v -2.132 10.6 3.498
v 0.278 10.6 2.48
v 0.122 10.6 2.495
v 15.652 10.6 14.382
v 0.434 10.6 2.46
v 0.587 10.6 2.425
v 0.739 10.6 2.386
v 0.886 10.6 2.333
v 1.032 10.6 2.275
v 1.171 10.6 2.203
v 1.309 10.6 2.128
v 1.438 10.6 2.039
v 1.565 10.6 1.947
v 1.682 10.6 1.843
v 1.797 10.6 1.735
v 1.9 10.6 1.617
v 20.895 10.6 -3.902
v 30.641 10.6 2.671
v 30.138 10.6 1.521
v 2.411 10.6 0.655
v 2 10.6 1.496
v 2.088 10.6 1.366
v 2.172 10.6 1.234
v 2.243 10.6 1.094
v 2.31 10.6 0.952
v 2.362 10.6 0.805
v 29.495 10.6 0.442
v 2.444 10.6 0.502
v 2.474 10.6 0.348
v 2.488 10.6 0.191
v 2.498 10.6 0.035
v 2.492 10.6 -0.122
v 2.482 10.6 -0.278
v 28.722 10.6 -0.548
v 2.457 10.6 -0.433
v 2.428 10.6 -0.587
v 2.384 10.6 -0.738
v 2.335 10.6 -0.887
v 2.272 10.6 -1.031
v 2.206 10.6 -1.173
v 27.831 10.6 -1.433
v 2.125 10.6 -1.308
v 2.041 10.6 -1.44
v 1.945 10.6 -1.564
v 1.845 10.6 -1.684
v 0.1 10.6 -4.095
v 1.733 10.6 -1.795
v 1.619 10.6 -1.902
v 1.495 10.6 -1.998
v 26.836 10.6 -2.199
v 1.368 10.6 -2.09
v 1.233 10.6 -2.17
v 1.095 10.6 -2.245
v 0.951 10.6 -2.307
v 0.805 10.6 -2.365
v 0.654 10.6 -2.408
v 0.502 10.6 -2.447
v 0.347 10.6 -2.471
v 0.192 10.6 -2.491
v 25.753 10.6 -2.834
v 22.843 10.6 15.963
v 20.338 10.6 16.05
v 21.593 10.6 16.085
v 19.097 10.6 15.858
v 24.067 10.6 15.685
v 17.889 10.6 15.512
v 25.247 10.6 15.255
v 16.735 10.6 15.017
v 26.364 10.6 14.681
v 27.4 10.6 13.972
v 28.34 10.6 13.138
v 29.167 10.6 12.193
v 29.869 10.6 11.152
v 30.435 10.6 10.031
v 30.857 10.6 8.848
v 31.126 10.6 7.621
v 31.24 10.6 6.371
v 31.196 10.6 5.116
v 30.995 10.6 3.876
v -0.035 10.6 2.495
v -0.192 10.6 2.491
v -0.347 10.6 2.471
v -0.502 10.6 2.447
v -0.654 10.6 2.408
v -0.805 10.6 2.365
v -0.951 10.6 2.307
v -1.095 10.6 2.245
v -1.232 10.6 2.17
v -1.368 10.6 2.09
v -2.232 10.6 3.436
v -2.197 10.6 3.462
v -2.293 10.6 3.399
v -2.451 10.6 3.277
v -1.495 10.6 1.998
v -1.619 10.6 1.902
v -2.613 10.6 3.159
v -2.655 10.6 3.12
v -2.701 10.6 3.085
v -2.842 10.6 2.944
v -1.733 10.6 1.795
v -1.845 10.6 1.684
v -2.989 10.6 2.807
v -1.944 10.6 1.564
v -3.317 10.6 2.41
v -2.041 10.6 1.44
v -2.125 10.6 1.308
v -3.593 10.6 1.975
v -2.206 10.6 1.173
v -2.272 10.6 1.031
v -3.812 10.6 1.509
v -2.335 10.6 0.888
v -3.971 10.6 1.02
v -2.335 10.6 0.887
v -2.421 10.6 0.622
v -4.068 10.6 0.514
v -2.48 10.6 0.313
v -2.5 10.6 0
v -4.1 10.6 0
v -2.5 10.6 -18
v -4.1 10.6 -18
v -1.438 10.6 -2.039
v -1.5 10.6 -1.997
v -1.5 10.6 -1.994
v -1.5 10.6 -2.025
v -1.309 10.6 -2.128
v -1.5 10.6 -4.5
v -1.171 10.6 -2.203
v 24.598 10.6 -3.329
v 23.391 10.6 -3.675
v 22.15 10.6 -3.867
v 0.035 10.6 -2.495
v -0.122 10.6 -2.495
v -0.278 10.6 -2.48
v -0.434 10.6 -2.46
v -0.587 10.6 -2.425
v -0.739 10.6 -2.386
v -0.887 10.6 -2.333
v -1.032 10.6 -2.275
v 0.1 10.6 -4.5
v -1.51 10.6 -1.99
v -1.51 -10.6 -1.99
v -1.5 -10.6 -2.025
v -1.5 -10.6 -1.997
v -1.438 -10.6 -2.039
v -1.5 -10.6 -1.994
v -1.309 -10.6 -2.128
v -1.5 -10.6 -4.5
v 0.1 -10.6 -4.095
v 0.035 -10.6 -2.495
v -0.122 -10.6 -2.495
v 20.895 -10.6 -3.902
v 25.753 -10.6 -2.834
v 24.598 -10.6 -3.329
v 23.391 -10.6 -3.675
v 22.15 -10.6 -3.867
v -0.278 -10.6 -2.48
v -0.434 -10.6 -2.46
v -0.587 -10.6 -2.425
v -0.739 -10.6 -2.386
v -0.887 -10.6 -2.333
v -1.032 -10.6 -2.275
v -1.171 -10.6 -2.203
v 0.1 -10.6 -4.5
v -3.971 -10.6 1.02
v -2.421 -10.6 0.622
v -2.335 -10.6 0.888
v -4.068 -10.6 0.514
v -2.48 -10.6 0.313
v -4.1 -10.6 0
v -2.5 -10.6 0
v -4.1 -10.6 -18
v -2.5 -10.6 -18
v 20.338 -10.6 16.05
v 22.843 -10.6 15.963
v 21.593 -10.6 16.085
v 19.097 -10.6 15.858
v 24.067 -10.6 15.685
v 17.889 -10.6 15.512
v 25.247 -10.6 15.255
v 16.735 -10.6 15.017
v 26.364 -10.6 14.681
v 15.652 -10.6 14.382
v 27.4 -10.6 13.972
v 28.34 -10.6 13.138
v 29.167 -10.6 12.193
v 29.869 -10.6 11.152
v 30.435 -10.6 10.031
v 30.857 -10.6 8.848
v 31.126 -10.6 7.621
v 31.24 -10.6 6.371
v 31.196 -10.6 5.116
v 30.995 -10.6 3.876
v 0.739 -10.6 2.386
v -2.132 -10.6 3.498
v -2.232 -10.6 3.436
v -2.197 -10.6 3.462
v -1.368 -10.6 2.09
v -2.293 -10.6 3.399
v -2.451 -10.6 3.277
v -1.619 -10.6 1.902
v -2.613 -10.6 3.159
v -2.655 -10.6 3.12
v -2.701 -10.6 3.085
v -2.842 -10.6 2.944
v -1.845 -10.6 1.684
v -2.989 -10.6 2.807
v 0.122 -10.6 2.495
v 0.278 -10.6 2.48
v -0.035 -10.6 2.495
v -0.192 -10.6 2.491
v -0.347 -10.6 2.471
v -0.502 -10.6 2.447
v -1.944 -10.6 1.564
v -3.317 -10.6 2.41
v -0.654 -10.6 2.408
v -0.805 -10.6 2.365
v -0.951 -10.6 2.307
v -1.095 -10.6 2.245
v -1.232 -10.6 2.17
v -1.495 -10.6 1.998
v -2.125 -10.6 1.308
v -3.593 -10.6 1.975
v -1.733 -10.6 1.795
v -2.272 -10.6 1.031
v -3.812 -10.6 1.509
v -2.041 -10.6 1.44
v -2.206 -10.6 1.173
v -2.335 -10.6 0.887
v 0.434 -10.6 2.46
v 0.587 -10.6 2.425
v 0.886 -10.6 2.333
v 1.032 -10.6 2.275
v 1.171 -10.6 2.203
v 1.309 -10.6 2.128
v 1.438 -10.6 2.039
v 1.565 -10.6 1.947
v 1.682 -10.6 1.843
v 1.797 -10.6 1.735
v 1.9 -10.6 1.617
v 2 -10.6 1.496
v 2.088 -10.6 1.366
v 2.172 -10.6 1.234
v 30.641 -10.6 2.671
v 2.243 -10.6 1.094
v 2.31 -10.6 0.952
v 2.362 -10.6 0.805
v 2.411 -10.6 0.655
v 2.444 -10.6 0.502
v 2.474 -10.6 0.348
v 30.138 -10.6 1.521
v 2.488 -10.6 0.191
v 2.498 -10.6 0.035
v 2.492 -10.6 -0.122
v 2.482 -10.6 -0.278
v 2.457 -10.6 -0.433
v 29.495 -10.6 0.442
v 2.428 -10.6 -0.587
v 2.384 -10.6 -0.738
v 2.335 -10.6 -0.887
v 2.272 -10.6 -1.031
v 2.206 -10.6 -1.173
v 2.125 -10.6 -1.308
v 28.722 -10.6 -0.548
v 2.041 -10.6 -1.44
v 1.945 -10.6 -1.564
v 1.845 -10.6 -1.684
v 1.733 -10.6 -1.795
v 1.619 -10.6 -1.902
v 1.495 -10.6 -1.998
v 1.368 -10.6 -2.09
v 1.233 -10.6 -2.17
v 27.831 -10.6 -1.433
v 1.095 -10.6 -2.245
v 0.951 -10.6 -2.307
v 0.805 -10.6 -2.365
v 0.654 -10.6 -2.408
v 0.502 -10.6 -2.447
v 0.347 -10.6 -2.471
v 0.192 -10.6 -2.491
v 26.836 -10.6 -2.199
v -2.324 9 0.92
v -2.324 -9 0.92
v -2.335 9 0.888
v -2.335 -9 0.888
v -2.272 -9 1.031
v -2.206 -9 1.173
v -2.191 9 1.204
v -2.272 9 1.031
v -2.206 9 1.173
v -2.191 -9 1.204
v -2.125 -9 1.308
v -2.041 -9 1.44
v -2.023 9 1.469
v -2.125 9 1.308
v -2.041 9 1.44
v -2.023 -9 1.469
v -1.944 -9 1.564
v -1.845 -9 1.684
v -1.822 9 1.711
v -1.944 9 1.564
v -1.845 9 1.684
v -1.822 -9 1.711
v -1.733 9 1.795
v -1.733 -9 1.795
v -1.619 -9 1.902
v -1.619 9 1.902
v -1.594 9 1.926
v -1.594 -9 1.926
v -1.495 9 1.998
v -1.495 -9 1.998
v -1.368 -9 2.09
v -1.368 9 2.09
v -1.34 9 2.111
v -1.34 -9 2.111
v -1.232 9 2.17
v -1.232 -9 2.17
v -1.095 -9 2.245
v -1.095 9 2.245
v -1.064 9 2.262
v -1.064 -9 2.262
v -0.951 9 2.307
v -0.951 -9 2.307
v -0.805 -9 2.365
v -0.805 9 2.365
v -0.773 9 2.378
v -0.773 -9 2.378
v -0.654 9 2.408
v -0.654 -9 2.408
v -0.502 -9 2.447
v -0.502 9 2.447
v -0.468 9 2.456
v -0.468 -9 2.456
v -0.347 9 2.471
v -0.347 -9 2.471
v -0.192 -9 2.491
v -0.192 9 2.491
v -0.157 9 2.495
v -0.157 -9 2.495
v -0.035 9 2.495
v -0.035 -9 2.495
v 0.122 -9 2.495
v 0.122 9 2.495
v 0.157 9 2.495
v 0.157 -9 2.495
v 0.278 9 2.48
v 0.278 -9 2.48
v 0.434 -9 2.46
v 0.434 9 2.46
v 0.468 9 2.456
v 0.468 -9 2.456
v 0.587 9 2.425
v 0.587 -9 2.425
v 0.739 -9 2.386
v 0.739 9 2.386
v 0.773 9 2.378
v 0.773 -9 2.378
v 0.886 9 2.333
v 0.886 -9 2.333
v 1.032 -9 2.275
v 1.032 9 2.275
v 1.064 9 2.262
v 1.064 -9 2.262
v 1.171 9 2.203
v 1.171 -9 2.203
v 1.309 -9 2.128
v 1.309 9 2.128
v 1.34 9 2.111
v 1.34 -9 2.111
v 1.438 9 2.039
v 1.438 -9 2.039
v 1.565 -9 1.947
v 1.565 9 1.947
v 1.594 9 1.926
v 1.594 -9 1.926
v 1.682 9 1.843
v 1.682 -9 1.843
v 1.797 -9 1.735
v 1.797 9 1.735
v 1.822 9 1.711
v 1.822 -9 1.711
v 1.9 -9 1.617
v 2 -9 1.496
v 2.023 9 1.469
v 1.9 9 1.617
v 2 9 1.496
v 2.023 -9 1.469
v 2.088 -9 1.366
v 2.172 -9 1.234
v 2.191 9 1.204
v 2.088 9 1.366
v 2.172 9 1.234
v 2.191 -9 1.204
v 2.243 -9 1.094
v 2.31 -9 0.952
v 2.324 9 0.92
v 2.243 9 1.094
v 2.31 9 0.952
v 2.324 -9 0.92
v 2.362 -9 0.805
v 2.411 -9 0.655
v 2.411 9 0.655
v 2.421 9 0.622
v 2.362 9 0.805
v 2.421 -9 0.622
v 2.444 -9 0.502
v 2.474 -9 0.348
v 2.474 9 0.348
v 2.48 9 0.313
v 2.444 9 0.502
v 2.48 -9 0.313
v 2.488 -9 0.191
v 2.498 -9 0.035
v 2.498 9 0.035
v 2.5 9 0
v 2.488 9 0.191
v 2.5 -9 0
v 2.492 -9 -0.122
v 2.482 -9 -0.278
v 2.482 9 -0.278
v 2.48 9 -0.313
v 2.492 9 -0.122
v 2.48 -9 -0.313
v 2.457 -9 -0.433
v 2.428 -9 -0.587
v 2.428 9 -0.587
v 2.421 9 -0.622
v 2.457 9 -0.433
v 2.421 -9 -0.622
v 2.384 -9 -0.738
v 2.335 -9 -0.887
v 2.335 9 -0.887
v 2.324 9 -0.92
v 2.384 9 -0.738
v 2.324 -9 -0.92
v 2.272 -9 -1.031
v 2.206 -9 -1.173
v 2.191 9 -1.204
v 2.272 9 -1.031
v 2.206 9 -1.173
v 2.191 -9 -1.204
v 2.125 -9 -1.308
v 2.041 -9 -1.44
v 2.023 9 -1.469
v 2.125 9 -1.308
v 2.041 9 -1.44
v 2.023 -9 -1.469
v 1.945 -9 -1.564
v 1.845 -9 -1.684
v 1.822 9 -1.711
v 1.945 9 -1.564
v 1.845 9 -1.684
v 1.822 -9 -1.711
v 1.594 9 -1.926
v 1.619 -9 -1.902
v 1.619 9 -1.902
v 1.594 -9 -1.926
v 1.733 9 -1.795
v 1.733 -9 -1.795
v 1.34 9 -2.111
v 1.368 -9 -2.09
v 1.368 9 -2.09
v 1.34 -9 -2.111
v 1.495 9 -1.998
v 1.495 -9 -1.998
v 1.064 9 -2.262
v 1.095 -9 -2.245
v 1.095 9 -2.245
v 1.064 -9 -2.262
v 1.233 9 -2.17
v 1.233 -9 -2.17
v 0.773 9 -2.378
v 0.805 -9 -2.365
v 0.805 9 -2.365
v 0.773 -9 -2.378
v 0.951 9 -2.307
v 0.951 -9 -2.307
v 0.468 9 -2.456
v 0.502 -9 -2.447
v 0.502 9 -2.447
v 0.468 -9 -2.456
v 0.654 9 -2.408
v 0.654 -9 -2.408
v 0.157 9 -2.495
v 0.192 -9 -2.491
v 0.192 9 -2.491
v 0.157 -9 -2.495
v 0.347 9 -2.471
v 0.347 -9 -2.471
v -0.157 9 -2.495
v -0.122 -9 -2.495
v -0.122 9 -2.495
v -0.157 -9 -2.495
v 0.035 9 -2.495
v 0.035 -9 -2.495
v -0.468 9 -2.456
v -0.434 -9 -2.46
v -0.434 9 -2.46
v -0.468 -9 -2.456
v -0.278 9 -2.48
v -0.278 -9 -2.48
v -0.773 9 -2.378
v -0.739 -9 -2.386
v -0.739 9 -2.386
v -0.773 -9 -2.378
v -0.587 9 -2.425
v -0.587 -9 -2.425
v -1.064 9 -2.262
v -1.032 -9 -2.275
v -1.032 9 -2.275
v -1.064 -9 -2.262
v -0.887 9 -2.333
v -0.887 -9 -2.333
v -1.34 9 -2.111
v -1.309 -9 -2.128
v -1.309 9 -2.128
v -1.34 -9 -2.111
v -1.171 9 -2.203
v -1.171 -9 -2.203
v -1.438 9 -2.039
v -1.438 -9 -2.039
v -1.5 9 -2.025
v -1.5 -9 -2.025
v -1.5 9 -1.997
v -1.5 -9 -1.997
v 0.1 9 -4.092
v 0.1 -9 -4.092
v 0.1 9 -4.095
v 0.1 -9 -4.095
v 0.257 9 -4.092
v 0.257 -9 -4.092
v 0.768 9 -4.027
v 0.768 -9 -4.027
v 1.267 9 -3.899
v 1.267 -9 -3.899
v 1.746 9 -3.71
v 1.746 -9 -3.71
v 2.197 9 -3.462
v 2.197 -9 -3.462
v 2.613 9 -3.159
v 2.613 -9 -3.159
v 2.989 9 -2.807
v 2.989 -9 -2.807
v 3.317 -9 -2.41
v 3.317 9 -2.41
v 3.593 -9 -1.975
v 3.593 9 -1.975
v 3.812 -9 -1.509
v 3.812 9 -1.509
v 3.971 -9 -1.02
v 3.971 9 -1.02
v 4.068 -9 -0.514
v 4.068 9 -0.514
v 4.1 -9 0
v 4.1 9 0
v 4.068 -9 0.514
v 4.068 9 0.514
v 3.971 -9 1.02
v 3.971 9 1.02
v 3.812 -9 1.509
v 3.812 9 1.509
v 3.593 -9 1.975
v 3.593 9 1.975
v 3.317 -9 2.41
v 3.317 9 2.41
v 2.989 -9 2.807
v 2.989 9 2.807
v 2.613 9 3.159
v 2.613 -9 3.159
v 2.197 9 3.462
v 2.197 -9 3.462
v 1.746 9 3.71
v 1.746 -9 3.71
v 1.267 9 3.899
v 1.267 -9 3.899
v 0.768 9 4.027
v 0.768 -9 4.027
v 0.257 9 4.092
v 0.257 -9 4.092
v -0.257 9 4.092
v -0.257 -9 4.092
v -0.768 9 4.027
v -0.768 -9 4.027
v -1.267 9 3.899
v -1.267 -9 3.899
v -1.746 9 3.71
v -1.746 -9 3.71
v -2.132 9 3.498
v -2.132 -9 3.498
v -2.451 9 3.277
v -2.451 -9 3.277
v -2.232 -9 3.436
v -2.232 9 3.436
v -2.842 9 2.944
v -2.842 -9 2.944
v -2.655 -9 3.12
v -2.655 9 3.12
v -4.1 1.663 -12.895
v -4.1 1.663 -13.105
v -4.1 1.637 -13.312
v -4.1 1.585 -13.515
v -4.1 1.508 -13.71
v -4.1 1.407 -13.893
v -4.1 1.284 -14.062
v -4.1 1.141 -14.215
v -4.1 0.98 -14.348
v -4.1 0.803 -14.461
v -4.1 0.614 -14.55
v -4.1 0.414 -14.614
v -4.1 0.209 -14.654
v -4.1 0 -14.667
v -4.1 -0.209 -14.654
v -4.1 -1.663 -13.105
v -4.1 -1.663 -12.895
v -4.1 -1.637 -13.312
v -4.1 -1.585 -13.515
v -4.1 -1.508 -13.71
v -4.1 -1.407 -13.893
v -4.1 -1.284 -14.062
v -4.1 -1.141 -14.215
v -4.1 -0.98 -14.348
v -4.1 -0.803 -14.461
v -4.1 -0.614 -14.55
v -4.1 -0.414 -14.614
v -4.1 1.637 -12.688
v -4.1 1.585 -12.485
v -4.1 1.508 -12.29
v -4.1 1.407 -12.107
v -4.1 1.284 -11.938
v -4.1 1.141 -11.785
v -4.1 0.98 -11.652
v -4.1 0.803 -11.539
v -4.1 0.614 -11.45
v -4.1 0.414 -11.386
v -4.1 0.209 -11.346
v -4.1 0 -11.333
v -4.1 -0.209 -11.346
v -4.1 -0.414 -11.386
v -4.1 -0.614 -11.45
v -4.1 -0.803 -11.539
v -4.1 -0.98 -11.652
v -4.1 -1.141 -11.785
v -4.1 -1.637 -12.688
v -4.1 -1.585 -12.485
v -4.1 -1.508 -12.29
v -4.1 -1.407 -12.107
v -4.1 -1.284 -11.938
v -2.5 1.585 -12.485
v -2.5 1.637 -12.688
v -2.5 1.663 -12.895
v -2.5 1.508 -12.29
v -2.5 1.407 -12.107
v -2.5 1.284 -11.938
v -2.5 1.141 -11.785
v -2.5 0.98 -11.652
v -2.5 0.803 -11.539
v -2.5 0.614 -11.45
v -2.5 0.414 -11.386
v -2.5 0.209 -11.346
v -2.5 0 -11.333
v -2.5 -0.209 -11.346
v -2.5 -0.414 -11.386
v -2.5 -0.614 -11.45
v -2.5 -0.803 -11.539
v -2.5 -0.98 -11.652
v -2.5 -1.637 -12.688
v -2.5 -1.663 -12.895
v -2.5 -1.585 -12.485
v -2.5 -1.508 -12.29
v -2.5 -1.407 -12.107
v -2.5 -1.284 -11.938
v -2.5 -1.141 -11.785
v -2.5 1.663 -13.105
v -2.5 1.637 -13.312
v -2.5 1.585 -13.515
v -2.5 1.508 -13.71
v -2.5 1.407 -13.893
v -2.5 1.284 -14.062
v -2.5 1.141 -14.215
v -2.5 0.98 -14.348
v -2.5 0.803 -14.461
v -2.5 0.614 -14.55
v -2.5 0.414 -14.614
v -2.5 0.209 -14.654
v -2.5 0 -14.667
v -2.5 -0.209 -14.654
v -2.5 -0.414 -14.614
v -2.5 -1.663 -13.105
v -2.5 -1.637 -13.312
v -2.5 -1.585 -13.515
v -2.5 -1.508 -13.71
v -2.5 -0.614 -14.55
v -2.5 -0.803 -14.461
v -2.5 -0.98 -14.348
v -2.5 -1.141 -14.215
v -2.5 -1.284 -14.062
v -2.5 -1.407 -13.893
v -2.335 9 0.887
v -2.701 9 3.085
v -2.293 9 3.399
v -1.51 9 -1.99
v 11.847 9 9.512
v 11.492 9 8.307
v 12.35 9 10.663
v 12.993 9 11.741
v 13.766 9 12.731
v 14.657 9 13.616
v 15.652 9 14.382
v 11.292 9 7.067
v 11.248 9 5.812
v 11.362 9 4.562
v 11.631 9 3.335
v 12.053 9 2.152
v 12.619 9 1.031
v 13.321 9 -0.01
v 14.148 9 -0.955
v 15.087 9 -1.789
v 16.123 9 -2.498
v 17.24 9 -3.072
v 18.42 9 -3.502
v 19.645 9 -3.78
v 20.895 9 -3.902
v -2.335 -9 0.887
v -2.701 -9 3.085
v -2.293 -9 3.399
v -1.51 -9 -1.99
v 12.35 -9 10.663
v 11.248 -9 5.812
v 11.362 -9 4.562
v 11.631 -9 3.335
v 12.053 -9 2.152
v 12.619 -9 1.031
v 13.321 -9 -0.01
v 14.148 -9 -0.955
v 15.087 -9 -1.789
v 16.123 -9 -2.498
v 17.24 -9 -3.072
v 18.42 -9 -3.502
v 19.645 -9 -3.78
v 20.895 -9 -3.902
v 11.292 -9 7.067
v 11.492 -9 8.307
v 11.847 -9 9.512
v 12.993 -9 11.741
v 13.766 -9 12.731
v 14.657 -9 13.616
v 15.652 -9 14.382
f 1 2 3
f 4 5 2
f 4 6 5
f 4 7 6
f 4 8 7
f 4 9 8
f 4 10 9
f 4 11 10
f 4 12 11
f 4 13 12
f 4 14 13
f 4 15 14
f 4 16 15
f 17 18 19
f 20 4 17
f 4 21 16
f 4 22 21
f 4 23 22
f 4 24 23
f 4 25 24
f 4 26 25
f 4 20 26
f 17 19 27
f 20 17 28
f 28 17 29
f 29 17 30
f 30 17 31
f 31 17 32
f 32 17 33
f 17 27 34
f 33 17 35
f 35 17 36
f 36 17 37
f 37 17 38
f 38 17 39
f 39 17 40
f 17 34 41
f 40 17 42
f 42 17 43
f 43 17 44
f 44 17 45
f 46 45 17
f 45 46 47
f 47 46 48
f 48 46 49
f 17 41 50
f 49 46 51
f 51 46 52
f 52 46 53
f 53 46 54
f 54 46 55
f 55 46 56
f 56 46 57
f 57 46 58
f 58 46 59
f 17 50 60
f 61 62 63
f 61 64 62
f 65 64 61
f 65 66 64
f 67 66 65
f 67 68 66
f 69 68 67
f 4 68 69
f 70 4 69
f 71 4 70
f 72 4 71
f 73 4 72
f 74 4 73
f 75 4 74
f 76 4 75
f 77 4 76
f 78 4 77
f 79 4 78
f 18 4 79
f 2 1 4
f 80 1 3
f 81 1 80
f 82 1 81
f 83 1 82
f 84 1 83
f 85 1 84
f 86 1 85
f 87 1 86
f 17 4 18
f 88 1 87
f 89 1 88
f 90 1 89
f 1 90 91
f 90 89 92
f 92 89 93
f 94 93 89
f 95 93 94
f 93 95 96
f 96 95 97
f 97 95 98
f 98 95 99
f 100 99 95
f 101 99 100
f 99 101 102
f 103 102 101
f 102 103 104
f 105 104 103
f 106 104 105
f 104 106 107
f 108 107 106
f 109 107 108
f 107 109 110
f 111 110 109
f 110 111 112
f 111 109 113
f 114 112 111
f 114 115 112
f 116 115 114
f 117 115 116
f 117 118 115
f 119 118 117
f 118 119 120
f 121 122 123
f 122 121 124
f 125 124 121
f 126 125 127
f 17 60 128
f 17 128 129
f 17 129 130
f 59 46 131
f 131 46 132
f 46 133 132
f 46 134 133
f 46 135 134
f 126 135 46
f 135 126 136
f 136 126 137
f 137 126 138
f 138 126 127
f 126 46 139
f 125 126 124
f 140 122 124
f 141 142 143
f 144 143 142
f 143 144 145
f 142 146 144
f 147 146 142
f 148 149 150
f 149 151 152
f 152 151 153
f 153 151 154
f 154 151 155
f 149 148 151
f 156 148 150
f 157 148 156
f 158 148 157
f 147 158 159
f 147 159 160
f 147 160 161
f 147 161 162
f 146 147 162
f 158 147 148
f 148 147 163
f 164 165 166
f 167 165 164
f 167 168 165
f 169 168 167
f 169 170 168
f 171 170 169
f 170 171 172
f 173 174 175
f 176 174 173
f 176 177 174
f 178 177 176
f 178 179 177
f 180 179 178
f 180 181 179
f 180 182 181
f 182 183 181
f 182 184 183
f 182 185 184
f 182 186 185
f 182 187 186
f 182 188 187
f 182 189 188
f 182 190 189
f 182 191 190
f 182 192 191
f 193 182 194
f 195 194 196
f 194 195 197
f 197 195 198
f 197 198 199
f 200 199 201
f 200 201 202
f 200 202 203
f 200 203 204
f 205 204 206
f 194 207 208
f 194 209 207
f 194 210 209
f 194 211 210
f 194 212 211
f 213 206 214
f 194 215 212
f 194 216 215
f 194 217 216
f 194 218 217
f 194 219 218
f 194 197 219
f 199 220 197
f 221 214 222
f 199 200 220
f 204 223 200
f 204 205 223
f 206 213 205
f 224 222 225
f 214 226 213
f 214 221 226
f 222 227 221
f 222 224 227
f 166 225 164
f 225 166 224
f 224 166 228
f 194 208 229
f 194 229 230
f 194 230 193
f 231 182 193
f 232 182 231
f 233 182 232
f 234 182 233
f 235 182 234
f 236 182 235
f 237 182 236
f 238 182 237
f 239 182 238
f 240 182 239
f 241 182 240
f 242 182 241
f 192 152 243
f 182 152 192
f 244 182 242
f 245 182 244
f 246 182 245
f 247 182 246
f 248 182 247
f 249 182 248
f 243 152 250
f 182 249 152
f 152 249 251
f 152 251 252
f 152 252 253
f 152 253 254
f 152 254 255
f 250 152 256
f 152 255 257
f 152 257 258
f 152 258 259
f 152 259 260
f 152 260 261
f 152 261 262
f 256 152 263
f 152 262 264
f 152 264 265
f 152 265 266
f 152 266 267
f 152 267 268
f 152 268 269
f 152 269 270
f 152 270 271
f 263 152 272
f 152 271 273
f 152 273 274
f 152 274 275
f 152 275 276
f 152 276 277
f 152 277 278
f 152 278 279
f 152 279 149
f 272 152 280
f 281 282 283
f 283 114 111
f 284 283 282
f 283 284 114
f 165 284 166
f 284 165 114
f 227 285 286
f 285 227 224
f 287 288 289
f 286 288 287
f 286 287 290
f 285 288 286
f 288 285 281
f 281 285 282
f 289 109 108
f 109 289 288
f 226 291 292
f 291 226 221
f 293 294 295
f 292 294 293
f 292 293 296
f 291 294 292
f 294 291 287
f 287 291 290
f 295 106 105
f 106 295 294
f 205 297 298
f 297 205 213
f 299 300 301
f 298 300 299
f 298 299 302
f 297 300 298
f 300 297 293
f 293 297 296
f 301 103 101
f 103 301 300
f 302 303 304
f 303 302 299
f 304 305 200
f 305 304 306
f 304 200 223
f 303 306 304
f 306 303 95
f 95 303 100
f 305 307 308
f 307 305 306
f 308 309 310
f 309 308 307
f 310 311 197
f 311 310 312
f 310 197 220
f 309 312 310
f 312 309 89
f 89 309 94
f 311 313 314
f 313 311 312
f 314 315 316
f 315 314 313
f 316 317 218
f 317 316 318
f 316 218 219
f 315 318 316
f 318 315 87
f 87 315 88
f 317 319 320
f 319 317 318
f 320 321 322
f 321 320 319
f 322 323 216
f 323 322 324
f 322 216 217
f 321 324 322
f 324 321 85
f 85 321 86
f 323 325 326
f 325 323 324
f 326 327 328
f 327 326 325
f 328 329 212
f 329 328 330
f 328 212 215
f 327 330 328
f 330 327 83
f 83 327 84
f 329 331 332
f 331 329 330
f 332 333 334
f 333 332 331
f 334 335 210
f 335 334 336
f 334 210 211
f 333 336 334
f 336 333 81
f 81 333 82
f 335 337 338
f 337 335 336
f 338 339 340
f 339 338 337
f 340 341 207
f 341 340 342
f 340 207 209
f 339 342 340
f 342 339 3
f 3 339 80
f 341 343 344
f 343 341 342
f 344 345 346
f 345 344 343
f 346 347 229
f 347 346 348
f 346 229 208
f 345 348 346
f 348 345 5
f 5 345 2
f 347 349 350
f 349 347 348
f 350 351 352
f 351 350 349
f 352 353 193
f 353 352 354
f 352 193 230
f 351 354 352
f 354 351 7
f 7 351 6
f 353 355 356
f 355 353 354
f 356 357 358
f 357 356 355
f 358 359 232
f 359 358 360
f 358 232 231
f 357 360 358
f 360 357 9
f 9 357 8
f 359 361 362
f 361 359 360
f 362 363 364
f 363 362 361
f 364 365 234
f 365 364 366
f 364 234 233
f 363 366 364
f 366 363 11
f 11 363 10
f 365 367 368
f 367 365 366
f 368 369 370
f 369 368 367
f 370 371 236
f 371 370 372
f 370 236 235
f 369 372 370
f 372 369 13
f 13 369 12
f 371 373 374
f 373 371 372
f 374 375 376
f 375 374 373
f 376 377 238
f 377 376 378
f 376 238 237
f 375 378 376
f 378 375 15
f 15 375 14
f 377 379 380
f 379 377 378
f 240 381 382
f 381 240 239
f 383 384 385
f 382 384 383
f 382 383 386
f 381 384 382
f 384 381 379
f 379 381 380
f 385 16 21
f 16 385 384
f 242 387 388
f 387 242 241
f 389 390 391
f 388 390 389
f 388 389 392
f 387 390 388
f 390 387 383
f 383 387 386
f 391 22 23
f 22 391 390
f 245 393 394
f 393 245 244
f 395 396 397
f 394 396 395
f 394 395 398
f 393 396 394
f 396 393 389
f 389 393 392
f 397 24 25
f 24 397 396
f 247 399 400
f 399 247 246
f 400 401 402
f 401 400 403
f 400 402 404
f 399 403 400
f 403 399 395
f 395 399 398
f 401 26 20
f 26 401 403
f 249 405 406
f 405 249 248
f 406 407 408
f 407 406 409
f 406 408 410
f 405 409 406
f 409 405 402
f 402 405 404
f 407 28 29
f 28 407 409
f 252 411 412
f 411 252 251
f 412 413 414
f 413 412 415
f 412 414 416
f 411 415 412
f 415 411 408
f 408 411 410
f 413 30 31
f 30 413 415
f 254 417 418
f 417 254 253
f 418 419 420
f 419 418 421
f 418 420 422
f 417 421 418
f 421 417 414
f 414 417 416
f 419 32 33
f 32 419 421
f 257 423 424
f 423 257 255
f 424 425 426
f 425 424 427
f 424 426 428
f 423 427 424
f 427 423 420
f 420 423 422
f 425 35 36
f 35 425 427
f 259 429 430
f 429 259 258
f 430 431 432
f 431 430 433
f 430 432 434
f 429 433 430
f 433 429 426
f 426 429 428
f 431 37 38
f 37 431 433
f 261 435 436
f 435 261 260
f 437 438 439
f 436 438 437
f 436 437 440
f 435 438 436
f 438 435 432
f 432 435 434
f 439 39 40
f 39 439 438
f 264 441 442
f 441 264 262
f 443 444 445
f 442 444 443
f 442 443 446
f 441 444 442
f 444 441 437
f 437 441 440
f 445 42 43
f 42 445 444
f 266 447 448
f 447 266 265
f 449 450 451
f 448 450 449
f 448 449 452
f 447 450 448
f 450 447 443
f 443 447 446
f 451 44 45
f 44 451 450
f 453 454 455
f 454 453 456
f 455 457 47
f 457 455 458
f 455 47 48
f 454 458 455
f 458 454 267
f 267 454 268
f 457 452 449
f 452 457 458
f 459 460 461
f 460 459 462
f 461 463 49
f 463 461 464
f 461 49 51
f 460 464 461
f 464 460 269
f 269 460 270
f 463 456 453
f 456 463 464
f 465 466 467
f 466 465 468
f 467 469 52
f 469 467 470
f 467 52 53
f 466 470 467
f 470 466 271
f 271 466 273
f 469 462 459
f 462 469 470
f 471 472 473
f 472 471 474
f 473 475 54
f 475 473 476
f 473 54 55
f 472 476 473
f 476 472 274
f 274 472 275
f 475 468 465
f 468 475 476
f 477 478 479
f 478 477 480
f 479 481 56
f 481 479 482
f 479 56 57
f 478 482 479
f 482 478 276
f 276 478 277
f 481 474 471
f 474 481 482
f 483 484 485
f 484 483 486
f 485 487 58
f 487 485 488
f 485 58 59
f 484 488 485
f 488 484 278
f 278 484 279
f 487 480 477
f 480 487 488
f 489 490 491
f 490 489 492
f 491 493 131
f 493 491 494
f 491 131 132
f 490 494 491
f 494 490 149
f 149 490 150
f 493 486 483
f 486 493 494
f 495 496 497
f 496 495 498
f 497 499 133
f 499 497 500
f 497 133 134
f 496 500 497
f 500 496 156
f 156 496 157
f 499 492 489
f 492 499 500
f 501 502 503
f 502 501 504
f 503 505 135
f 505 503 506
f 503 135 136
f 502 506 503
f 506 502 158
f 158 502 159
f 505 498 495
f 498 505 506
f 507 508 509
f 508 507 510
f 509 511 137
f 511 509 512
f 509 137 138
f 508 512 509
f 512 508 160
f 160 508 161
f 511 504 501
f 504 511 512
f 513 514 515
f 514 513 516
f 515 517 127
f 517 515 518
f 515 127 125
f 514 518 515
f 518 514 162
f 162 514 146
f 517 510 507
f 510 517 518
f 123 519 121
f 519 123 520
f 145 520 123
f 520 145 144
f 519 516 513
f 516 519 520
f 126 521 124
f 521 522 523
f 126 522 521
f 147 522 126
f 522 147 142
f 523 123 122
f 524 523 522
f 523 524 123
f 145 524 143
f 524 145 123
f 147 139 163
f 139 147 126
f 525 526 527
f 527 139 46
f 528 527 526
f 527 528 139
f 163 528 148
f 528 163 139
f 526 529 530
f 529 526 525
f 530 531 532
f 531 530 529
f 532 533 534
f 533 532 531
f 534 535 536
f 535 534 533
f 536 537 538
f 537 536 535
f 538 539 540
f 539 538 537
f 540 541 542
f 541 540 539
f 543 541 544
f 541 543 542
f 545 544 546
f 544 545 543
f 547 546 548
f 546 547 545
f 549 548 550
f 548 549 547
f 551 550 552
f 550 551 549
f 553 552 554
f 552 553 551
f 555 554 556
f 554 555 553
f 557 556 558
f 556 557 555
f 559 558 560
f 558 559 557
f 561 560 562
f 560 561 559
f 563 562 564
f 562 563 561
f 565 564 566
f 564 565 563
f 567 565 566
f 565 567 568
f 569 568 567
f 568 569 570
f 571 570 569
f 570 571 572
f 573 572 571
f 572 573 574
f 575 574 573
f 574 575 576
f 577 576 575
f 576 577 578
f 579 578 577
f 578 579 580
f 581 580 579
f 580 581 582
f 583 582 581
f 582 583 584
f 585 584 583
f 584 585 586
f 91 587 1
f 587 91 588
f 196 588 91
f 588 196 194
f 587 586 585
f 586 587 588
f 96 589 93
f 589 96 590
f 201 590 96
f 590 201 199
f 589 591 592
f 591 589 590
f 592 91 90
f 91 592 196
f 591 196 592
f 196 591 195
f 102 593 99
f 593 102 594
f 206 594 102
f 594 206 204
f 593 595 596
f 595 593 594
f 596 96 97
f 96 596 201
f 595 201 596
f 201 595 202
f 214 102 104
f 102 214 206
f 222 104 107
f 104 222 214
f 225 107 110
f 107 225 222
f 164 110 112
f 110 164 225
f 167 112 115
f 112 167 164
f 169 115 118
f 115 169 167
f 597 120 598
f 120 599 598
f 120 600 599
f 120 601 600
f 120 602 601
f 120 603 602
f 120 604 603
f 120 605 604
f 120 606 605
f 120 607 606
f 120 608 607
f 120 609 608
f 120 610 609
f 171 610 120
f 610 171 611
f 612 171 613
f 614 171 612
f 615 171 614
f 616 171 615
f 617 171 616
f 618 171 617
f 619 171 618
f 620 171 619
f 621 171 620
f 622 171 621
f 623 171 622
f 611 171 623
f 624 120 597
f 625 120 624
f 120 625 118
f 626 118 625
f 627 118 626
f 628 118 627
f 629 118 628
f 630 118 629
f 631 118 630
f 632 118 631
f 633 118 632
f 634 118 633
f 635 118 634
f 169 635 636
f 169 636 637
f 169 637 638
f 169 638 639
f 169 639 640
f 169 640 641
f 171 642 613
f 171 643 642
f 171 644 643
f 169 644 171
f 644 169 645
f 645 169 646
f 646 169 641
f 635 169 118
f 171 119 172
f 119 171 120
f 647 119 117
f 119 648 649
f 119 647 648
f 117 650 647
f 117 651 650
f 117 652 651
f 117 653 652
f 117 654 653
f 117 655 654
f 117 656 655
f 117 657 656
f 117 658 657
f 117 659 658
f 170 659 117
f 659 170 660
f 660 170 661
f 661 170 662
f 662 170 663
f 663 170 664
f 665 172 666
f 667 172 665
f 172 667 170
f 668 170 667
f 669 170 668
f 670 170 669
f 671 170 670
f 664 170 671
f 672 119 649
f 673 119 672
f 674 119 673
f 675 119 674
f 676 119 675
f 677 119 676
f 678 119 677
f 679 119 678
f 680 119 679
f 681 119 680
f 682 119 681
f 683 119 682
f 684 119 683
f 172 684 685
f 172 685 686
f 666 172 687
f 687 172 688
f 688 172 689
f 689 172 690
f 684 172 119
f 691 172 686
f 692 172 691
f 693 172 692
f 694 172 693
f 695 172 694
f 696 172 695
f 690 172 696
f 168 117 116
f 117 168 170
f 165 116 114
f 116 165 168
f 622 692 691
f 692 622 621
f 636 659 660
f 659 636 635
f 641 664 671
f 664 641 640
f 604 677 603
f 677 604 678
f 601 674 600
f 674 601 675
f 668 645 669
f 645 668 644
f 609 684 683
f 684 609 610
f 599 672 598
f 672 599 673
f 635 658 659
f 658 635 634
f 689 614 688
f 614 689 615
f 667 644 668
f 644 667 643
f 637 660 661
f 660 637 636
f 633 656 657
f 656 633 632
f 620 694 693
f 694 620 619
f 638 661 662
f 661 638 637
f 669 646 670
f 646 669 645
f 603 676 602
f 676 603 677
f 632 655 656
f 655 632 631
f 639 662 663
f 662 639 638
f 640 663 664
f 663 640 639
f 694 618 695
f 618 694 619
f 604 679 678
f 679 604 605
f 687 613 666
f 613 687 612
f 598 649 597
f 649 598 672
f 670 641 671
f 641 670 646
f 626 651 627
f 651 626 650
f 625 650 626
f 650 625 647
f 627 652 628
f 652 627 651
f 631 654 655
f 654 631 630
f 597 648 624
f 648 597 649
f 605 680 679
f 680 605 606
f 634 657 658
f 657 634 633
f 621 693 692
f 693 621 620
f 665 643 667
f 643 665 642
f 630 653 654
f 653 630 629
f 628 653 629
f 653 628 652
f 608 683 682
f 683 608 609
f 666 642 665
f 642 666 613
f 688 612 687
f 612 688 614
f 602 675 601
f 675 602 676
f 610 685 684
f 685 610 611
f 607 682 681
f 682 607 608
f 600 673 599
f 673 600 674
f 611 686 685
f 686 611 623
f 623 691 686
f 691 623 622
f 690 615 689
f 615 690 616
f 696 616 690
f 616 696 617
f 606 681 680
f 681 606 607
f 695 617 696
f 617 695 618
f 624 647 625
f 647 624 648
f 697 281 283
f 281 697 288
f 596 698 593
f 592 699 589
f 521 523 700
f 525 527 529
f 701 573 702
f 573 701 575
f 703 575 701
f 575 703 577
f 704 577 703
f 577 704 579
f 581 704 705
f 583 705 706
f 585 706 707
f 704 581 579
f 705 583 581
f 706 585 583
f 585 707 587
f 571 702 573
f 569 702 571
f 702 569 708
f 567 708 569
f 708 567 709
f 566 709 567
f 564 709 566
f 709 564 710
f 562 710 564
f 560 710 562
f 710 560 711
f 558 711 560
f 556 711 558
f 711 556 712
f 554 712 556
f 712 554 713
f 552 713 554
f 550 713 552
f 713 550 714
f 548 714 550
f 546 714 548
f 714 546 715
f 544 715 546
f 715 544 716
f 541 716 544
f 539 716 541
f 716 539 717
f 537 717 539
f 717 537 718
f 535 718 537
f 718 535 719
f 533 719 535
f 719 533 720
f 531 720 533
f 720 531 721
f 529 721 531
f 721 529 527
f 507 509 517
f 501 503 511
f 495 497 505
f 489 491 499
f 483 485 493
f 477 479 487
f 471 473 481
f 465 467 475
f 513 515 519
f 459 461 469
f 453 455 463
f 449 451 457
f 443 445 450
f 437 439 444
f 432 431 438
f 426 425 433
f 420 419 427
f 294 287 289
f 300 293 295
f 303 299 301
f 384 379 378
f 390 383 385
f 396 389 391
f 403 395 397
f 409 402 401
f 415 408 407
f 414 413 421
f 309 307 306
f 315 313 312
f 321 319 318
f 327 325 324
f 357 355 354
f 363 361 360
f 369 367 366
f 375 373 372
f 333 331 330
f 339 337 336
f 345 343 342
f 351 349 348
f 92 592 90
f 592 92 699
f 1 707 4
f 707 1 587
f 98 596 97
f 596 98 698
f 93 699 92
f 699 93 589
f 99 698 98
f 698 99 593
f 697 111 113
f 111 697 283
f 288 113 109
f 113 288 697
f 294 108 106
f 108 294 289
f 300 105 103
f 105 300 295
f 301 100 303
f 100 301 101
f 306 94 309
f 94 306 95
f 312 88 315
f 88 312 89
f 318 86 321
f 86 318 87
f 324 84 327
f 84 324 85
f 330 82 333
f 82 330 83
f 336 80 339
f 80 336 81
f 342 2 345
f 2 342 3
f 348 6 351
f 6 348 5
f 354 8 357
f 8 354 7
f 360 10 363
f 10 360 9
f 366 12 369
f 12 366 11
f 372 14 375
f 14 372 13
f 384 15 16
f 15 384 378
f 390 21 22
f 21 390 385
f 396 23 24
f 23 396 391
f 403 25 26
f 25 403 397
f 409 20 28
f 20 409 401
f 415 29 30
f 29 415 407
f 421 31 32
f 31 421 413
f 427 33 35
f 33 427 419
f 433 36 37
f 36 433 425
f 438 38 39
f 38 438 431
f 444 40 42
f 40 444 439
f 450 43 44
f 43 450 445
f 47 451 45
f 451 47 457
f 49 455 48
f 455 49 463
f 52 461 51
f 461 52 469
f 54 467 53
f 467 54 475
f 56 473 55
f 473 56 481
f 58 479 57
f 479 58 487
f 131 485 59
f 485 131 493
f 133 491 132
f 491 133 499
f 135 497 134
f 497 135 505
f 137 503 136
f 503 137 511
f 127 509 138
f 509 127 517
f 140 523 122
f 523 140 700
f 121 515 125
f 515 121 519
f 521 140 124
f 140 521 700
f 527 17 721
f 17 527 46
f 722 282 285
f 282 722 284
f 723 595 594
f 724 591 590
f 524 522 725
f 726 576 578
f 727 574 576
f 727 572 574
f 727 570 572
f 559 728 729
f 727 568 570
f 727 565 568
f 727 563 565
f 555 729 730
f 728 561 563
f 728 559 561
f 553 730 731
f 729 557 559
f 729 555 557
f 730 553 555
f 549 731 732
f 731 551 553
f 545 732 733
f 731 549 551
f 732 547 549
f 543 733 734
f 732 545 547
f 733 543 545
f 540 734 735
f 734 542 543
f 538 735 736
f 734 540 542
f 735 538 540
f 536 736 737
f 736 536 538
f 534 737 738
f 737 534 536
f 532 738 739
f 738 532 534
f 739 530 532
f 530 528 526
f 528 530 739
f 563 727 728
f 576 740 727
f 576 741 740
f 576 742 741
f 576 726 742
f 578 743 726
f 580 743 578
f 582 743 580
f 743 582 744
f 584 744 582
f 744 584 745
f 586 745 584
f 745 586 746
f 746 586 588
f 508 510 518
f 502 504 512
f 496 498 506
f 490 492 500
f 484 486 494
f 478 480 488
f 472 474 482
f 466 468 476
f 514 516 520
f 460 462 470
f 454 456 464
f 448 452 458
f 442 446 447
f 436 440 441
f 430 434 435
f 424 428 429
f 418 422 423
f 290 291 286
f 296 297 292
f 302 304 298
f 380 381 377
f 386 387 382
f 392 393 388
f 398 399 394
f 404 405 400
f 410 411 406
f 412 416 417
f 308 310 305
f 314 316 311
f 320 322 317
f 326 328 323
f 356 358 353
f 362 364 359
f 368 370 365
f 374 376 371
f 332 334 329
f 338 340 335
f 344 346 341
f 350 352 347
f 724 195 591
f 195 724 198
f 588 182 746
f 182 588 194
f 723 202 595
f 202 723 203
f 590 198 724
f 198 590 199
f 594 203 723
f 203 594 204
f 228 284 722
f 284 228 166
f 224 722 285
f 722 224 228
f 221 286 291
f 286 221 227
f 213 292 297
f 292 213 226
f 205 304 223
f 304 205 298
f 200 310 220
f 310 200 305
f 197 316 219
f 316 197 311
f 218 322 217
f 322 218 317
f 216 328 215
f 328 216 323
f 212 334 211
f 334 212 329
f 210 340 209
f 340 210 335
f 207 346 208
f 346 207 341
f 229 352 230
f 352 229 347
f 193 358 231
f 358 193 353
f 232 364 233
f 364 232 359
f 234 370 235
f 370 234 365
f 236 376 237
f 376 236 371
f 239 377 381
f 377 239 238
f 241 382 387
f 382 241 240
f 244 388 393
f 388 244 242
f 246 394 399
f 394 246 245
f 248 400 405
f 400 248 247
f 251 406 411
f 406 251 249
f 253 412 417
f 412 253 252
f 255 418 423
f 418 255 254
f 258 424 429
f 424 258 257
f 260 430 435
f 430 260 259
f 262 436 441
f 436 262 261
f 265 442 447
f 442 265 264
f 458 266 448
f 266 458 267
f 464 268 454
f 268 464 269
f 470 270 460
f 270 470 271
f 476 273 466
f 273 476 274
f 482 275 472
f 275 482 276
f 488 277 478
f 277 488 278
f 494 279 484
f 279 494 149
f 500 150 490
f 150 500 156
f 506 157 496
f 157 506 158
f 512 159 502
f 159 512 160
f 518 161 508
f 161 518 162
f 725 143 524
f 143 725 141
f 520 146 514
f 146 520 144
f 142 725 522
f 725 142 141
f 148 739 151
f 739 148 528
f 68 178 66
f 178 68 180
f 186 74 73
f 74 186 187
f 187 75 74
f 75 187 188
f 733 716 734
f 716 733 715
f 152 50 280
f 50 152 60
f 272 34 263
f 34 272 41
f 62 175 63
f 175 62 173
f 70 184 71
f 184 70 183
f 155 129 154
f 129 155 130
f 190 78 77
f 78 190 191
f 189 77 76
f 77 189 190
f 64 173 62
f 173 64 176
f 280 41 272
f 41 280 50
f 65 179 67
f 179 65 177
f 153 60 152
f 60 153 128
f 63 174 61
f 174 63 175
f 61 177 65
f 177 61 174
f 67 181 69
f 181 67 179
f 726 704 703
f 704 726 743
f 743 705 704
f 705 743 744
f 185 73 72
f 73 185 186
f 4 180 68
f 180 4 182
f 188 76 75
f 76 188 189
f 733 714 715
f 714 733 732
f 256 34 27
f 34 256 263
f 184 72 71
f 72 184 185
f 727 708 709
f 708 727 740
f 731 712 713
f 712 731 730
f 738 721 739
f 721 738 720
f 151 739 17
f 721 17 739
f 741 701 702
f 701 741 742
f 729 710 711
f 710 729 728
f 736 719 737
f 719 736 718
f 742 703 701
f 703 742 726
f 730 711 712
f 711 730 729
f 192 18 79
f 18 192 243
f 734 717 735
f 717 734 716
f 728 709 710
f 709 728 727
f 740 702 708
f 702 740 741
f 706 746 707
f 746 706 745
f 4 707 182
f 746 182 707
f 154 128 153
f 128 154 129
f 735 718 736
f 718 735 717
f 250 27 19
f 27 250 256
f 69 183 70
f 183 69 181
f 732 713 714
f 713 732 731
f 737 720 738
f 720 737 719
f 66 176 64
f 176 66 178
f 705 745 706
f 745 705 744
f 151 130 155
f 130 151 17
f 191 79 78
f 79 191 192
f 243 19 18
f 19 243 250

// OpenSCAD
$fn = 50;

thickness = 1.6;
width = 18 + 2 * thickness;
hole_height = 13;
hole_r = 5 / 3;
rim_r = 5 / 2;
basket_thickness = 1;
base_height = hole_height + 5;
base_height_front = rim_r + 2;

clip_width_inner = 9;
clip_width_outer = 12;
clip_height_inner = 1;
clip_height_outer = 1;
clip_length = 23;
lever_length = 32;
lever_width = 5;

rod_r = 20 / 2;
rod_distance = rim_r + thickness + rod_r + 8;
rod_angle = 16;

module base_2d() {
    difference() {
        union() {
            translate([ -thickness, -base_height ]) square([ thickness + basket_thickness, base_height ]);
            translate([ basket_thickness, -base_height_front ]) square([ thickness, base_height_front ]);
            translate([ rim_r, 0 ]) circle(rim_r + thickness);
        }
        translate([ rim_r, 0 ]) circle(rim_r);
        translate([ 0, -base_height ]) square([ basket_thickness, base_height ]);
    }
}

module base() {
    difference() {
        rotate([ 90, 0, 0 ]) linear_extrude(width, center = true) base_2d();
        translate([ 0, 0, -hole_height ]) rotate([ 0, -90, 0 ]) cylinder(r = hole_r, h = 10, center = true);
    }
}

module clip_2d() {
    translate([ -clip_width_outer / 2, 0 ]) square([ clip_width_outer, clip_height_outer ]);
    translate([ -clip_width_inner / 2, clip_height_outer ]) square([ clip_width_inner, clip_height_inner ]);
    translate([ -clip_width_outer / 2, clip_height_outer + clip_height_inner ]) square([ clip_width_outer, clip_height_outer ]);
}

module clip() {
    translate([ lever_length - clip_length, 0, 0 ]) rotate([ 90, 0, 90 ]) linear_extrude(clip_length) clip_2d();
    translate([ 0, -lever_width / 2, clip_height_outer + clip_height_inner ]) cube([ lever_length, lever_width, clip_height_outer ]);
}

module rod_holder_2d() {
    difference() {
        hull() {
            circle(rim_r + thickness);
            translate([ rod_distance, 0 ]) circle(rod_r);
        }
        circle(rim_r);
        translate([ -12, 0 ]) square(20, center = true); // mask
    }
}

module rod_holder() {
    rotate([ 90, 0, 0 ]) linear_extrude(thickness) rod_holder_2d();
}

module rod_with_holder() {
    translate([ 0, width / 2, 0 ]) rod_holder();
    translate([ 0, -width / 2 + thickness, 0 ]) rod_holder();
    translate([ rod_distance, 0, 0 ]) rotate([90, 0, 0]) cylinder(r = rod_r, h = width, center = true);
}

translate([ -rim_r, 0, 0 ]) base();
rotate([ 0, -rod_angle, 0 ]) rod_with_holder();
